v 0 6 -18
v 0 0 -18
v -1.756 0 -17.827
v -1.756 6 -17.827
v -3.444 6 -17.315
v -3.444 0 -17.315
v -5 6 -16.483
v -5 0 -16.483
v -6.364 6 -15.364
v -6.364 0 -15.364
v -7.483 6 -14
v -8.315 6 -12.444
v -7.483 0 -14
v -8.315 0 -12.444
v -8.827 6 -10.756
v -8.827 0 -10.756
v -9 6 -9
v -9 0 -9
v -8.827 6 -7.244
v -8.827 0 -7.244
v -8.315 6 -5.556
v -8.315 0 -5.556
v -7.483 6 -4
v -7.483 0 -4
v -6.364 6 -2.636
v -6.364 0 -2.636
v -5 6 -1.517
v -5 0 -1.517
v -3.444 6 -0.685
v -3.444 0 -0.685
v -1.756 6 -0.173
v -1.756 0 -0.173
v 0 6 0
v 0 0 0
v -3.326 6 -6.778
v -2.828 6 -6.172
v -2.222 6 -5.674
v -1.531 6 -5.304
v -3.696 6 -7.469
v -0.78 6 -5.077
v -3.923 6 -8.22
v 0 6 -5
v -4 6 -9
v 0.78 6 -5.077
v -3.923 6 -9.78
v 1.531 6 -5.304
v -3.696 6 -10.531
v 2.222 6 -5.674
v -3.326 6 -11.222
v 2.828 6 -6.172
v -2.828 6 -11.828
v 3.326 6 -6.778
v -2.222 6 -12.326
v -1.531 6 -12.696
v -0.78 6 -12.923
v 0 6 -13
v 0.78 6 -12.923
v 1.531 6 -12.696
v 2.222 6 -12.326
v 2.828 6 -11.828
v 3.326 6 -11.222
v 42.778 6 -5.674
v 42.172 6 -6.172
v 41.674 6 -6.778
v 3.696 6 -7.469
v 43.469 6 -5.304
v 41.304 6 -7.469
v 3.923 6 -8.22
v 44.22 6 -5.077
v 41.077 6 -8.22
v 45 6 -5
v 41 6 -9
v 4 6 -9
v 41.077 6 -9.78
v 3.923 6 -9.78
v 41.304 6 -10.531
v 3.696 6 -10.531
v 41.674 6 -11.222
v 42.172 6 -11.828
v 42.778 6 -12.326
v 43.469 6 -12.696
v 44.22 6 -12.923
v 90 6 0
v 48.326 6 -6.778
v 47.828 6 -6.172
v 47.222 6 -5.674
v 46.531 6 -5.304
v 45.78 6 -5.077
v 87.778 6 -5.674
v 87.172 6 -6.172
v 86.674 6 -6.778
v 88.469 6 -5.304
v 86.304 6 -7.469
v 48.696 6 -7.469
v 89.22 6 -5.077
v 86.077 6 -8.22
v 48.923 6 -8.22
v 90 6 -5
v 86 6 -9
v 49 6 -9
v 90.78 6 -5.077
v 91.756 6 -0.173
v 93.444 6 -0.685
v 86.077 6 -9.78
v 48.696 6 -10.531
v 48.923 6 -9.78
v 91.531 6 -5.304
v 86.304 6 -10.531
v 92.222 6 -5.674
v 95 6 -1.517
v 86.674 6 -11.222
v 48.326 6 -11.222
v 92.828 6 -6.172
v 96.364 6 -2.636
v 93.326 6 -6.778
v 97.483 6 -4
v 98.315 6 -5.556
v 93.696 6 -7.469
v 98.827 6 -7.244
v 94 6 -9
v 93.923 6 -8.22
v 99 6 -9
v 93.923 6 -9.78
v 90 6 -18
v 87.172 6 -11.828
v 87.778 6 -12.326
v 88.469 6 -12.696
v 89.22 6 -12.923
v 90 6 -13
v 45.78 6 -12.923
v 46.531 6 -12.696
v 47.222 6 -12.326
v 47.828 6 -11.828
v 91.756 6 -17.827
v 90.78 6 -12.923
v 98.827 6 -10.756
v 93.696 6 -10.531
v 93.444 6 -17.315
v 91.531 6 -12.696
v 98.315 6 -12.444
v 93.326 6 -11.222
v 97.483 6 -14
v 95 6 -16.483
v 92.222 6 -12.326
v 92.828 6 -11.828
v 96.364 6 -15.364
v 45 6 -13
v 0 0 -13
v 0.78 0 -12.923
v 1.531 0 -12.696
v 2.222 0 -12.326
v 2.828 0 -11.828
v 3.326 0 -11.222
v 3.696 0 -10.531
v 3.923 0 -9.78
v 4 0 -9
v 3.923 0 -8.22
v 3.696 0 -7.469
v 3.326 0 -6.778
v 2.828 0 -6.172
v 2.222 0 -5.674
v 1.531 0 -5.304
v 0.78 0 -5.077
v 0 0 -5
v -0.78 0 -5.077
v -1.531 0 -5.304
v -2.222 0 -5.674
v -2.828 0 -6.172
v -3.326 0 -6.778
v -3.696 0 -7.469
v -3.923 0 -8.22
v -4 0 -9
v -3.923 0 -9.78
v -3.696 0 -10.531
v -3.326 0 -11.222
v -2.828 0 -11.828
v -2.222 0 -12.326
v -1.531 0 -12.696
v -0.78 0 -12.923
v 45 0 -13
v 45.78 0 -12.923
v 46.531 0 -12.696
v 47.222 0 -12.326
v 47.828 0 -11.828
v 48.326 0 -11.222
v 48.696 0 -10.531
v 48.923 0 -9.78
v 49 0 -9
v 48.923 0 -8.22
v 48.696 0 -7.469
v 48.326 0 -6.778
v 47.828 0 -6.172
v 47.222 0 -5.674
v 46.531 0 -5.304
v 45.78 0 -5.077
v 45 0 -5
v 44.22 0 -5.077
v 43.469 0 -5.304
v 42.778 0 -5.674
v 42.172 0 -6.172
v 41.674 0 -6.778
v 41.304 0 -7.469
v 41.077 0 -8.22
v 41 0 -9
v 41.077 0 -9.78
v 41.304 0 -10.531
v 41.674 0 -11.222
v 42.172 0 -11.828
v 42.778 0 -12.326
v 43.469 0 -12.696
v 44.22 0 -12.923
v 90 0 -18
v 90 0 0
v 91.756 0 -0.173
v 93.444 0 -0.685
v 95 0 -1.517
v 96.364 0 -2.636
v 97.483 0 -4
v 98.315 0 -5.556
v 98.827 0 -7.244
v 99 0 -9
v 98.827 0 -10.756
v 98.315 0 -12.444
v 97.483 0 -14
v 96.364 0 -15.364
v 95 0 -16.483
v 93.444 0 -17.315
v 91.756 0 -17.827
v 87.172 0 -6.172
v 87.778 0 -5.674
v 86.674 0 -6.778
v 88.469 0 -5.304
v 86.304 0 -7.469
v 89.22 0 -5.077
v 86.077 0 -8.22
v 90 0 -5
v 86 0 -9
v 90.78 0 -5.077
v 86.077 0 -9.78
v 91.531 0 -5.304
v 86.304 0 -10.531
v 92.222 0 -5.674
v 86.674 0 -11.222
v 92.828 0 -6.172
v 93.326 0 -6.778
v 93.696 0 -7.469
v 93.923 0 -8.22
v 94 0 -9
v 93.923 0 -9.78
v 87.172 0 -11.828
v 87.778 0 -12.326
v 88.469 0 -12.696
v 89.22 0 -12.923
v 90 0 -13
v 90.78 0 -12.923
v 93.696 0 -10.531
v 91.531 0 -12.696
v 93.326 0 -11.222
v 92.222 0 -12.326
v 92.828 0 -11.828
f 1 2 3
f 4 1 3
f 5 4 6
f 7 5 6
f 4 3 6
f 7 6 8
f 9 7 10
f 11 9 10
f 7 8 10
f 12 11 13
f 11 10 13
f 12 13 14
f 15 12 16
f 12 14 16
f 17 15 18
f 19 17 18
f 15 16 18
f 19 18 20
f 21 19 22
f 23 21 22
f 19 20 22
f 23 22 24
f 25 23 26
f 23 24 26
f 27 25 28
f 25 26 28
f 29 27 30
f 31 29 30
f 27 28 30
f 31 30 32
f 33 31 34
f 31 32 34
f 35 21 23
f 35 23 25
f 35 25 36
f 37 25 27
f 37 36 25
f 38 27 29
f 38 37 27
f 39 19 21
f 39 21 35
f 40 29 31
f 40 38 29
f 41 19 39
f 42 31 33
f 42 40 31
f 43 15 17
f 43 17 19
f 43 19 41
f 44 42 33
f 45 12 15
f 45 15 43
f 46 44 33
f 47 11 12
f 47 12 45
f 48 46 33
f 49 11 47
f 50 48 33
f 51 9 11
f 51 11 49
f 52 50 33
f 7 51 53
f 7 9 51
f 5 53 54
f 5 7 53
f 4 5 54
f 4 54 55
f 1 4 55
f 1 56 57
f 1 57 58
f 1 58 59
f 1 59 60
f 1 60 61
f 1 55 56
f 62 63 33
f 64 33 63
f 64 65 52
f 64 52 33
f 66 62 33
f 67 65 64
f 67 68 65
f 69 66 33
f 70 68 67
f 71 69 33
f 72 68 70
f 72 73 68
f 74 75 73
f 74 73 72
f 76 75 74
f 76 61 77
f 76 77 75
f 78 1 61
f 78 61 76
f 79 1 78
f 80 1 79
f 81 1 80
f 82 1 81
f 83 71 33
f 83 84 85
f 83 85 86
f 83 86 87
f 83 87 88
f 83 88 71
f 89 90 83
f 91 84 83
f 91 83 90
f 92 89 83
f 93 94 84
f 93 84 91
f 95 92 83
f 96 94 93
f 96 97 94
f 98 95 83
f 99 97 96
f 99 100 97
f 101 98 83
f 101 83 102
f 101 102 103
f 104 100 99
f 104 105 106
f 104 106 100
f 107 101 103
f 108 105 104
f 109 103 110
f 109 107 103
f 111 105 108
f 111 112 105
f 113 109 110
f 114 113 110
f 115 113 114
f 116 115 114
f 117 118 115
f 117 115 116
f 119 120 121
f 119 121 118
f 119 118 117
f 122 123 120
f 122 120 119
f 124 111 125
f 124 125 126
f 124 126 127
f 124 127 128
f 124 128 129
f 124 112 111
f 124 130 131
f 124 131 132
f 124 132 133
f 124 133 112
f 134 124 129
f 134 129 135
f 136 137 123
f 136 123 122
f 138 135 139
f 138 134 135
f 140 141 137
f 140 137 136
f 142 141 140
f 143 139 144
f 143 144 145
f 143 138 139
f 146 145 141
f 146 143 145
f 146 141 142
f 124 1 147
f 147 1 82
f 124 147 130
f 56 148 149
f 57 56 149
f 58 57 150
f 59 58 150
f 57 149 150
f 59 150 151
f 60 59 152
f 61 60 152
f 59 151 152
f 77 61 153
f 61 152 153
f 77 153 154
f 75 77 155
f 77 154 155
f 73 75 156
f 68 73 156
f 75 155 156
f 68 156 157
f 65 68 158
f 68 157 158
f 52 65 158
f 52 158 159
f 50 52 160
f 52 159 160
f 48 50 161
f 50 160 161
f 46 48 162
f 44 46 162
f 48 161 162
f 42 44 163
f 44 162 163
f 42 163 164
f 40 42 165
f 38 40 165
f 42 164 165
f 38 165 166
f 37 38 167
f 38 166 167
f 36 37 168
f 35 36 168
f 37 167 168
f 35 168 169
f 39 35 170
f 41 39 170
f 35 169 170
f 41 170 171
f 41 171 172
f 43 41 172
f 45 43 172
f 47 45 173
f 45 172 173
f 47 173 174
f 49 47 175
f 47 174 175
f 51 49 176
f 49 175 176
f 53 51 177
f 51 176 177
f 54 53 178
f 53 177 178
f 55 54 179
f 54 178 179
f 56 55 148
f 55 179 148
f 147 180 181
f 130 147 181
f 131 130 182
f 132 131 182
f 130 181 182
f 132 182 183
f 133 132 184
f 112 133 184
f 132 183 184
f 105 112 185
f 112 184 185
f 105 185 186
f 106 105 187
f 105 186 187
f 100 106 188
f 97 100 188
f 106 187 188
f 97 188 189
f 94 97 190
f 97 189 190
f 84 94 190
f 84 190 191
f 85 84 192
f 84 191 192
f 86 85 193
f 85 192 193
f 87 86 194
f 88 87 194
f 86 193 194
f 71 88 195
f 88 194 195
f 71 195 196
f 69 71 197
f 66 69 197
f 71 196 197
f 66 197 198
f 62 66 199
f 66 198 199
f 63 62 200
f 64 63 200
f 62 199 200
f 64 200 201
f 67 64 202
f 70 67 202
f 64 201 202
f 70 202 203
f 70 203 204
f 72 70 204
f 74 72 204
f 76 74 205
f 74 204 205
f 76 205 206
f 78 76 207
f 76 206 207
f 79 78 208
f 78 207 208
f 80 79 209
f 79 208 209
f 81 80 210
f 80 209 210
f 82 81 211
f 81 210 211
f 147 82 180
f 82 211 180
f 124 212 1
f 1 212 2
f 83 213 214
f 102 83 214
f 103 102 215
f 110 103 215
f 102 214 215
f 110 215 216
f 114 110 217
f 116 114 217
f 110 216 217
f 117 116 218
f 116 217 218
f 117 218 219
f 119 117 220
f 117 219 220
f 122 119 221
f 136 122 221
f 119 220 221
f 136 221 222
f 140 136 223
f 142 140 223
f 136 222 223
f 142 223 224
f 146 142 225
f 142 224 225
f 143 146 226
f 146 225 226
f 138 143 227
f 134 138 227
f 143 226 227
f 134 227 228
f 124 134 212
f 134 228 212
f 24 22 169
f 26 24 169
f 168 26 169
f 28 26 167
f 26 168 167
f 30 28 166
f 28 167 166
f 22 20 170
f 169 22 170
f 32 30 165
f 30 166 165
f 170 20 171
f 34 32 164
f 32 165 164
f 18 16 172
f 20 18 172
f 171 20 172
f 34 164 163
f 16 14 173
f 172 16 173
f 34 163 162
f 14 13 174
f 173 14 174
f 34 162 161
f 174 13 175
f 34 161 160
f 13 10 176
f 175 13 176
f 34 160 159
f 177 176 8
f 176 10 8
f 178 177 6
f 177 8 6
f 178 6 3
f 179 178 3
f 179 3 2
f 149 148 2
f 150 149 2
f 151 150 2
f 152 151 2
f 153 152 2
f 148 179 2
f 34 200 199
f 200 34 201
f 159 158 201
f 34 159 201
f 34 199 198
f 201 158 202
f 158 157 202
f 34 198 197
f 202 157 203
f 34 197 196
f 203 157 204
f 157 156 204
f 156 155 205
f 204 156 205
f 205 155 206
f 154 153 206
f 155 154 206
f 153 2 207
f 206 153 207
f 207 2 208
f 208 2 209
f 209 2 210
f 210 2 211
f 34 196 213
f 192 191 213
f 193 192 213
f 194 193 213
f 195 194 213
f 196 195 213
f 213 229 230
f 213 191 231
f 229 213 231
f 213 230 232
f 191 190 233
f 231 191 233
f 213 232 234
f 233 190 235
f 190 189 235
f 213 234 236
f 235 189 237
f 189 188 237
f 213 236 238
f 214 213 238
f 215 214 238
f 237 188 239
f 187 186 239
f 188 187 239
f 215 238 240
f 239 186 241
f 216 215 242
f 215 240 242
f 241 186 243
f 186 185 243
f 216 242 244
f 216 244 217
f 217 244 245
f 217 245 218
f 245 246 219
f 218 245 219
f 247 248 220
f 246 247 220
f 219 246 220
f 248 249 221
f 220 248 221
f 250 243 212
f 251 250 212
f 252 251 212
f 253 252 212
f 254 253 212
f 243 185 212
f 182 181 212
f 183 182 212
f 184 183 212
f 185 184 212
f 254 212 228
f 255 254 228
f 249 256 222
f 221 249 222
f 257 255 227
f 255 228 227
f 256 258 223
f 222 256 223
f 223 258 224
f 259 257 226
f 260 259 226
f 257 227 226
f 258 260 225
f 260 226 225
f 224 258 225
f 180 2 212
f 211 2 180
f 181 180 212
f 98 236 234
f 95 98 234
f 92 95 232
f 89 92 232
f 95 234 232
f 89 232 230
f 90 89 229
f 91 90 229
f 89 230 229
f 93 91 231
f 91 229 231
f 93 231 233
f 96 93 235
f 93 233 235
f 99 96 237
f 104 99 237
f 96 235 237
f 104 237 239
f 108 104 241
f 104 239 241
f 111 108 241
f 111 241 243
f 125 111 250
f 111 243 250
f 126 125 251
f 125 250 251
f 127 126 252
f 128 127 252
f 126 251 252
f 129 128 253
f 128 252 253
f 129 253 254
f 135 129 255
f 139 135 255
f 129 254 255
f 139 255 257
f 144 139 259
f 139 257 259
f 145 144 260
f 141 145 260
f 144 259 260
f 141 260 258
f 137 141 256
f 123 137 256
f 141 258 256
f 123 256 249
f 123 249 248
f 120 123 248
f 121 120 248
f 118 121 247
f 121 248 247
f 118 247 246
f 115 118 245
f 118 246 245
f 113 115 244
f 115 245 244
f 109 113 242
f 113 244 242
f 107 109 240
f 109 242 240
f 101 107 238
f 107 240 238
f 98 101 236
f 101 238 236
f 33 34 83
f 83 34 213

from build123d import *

# Parameters (mm, degrees)
BOSS_EXTRUDE1_DEPTH = 6
SKETCH3_R           = 4
CUT_EXTRUDE1_DEPTH  = 6


with BuildPart() as part:
    # Sketch2 → Boss-Extrude1 (new body)
    with BuildSketch(Plane(origin=(0, 0, 0), x_dir=(1, 0, 0), z_dir=(0, 1, 0))):
        with BuildLine():
            Line((0, 0), (90, 0))
            ThreePointArc((90, 0), (99, 9), (90, 18))
            Line((90, 18), (0, 18))
            ThreePointArc((0, 18), (-9, 9), (0, 0))
        make_face()
    extrude(amount=BOSS_EXTRUDE1_DEPTH)

    # Sketch3 → Cut-Extrude1 (cut)
    with BuildSketch(Plane.XZ):
        with Locations(Location((0, -9, 0), (0, 0, 270))):
            Circle(SKETCH3_R)
        with Locations(Location((90, -9, 0), (0, 0, 90))):
            Circle(SKETCH3_R)
        with Locations(Location((45, -9, 0), (0, 0, 270))):
            Circle(SKETCH3_R)
    extrude(amount=-CUT_EXTRUDE1_DEPTH, mode=Mode.SUBTRACT)


solid = part.part
